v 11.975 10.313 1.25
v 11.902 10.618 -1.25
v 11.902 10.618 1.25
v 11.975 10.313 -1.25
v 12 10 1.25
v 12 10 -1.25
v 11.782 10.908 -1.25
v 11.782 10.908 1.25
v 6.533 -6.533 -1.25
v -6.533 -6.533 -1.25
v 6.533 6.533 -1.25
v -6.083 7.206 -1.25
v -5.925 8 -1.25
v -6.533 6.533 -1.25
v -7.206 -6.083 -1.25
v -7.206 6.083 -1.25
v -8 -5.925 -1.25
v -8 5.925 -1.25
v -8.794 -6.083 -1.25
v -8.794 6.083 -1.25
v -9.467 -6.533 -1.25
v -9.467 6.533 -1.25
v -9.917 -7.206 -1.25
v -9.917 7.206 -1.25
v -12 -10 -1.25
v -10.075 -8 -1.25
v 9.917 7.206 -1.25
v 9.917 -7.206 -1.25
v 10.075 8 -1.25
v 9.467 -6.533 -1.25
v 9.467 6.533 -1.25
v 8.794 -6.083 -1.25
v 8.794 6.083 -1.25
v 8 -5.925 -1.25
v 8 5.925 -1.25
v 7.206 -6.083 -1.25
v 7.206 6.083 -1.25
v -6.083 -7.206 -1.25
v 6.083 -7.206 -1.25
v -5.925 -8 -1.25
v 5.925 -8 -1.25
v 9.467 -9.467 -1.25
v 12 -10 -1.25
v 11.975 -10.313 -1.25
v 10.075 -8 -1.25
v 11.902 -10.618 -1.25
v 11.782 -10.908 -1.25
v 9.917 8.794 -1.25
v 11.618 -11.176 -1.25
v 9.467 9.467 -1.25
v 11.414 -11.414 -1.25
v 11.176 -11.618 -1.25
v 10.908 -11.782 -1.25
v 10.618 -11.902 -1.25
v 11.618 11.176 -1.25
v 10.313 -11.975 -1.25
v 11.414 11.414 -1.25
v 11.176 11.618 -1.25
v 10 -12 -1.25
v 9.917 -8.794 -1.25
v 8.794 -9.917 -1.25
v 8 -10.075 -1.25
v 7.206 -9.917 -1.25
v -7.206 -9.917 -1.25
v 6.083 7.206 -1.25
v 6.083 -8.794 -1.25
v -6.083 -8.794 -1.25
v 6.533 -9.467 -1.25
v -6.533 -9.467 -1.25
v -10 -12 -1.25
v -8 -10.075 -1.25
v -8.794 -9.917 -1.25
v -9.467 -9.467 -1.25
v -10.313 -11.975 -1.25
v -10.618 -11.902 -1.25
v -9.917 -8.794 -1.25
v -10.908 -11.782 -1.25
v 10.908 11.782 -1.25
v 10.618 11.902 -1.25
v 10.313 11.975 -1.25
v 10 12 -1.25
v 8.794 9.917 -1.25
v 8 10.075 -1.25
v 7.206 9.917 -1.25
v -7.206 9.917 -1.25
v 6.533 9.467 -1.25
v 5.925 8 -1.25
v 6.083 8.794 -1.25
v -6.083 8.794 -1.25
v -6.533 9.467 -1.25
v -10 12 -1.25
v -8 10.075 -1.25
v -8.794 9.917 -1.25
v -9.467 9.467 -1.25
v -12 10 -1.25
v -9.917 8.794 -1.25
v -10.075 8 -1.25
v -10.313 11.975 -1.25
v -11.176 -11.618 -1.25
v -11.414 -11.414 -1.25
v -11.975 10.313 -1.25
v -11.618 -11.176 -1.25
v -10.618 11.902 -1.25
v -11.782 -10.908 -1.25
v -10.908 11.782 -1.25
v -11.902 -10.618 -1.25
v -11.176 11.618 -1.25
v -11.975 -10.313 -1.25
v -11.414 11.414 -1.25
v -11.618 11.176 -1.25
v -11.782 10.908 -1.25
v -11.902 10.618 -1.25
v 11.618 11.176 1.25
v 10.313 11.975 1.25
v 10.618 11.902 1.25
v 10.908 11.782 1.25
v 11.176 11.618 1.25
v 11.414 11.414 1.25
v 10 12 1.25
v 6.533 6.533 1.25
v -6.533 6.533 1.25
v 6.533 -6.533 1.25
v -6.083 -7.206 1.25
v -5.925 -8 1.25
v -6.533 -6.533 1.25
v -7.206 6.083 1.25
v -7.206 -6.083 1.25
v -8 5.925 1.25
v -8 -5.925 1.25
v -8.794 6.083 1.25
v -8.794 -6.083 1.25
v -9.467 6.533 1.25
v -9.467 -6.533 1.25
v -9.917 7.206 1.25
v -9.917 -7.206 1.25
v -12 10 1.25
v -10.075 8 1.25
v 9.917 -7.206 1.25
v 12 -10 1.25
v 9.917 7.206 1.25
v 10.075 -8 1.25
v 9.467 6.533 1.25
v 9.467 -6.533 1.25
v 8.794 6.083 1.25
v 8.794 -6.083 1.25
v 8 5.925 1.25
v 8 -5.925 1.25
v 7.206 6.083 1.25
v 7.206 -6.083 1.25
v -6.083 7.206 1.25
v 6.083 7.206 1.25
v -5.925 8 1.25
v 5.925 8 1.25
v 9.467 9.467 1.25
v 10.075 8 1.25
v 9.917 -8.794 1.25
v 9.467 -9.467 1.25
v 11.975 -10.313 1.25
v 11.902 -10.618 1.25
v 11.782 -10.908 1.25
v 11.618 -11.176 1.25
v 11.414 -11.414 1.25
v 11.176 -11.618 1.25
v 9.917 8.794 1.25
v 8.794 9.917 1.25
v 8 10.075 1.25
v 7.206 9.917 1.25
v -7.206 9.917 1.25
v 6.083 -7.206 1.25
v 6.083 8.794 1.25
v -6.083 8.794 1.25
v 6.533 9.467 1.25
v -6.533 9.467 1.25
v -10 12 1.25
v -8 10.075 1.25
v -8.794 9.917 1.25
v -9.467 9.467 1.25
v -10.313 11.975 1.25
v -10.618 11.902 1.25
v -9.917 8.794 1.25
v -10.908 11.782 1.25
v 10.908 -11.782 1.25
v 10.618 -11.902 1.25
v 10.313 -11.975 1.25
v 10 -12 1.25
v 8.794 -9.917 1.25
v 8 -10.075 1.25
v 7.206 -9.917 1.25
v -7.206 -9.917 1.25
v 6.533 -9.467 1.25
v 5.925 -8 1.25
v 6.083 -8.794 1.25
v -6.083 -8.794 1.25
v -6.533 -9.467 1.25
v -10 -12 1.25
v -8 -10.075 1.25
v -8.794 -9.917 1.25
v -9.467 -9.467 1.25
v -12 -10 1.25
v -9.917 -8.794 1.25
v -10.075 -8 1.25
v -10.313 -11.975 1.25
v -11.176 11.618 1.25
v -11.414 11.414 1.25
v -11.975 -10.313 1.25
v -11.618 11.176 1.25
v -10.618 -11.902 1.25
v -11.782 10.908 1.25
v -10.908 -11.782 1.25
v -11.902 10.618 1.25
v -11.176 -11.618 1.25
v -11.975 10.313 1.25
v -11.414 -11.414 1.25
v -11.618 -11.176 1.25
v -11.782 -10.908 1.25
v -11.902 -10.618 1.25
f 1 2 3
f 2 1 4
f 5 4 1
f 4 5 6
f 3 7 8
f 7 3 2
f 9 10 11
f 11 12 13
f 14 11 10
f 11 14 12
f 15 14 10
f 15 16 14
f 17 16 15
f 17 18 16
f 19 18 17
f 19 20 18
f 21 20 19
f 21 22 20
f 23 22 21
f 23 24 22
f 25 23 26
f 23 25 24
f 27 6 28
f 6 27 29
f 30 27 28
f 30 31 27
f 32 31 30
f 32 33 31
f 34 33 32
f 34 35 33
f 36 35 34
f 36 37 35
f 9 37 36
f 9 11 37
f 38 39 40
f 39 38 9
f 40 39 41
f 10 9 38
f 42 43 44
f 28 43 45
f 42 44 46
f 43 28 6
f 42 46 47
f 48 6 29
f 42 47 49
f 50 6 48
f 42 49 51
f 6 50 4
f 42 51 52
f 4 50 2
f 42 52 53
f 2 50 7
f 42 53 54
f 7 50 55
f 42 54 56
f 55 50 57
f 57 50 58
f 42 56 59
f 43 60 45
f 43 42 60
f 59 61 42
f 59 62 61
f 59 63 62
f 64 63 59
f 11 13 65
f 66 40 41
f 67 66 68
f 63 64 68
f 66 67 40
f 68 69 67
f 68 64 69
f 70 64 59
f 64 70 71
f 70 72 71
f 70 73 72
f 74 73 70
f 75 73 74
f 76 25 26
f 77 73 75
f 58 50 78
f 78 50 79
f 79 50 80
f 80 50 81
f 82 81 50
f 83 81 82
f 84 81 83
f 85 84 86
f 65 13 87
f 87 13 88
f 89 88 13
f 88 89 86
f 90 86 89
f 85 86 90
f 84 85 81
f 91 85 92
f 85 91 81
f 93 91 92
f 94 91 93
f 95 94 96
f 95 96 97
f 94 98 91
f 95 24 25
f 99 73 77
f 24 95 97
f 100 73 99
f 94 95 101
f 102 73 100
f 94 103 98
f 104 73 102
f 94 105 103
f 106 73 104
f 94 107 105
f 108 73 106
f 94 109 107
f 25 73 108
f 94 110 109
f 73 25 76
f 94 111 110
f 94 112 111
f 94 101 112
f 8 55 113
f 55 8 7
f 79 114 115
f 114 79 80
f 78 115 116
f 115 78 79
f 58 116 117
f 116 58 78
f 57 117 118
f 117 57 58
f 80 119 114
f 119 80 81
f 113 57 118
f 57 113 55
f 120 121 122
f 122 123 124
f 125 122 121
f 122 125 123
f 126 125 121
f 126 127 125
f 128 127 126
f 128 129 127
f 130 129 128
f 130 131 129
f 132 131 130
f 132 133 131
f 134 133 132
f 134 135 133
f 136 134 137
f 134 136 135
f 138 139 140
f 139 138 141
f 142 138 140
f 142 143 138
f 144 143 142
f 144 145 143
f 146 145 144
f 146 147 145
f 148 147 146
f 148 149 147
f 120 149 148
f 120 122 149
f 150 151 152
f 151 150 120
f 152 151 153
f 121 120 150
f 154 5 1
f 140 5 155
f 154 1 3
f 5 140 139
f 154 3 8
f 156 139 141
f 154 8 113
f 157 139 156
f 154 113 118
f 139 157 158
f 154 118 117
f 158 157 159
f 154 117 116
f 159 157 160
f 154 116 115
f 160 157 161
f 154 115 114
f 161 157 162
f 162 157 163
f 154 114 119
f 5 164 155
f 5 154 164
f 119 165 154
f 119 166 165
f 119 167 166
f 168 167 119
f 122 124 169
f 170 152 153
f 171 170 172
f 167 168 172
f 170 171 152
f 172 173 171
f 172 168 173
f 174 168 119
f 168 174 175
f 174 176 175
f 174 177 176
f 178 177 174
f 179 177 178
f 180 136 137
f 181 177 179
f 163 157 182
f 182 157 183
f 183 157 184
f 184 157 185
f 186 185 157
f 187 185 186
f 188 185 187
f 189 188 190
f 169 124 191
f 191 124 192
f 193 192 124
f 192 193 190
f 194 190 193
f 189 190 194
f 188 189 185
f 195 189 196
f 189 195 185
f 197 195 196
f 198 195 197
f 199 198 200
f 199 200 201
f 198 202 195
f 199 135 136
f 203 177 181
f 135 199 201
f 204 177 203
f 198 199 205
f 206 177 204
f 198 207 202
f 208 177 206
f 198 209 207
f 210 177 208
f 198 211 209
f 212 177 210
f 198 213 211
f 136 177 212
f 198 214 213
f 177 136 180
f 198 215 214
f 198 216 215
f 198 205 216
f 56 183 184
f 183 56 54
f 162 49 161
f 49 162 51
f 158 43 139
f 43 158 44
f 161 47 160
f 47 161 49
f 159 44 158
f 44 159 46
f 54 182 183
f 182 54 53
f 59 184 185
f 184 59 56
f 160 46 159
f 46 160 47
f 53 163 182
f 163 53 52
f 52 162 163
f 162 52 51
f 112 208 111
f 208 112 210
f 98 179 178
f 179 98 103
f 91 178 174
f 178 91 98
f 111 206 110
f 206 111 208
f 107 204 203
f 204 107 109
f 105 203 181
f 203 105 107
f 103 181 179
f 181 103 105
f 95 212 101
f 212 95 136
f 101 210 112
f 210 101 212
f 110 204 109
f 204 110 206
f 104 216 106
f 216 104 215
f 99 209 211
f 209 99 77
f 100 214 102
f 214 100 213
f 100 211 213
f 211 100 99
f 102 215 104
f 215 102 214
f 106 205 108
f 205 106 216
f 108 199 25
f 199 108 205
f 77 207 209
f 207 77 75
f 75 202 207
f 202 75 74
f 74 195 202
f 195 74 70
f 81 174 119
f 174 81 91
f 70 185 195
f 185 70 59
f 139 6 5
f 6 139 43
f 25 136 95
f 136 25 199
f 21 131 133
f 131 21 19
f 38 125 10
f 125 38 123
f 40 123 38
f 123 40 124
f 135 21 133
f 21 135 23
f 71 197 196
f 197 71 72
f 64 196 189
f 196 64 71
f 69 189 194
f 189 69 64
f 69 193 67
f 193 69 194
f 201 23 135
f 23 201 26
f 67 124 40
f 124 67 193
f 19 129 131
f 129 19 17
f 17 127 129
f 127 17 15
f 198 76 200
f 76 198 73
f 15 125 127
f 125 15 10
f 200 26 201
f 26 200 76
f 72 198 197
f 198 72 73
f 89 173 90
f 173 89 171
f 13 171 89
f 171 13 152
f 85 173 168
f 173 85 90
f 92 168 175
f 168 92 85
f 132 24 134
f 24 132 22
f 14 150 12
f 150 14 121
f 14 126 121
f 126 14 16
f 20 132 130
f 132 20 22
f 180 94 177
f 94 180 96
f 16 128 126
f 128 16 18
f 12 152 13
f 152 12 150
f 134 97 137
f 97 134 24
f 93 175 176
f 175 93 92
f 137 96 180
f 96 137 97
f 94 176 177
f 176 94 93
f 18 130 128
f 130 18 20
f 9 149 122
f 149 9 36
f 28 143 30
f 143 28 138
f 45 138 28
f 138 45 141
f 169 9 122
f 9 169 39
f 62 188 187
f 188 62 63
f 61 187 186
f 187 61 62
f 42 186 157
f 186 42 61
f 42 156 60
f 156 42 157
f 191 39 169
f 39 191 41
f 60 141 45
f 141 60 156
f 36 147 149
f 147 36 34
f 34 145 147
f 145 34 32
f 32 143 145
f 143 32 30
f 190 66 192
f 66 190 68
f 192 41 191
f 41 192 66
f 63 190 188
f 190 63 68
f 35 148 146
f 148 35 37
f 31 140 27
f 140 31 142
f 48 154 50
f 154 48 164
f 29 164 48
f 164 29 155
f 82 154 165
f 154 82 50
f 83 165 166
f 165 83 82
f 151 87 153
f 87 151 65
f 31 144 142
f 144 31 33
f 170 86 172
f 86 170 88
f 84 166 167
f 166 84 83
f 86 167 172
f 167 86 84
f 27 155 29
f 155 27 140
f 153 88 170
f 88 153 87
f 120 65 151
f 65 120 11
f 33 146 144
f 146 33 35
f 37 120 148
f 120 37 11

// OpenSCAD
// Created by Heindal at Thingiverse on March 2015

// Values for user to edit

// Thickness of shim, mounting plate, or standoff
thickness = 2.5; // [1:25]

// Length of shim
length = 24; // [8,12,24,40,56]

// Hole Diameter
holeDia = 4.15; // [3.4:3.4mm for Tap, 4.15:4.15mm for Tight Fit, 4.3:4.3mm for Loose Fit] 

/* [Hidden] */
// Calculated values - edit at your own risk
width = 24;

module rounded_box(l,w,h,r_edge){

cube(size=[l-2*r_edge,w-2*r_edge,h ],center=true);

for (x = [l/2-r_edge,-(l/2-r_edge) ]) {
	for (y = [(w/2-r_edge),-(w/2-r_edge)]) {
		translate([x,y,0]) cylinder(r1=r_edge,r2=r_edge,h=h,center=true,$fn=40);
	}
}
translate([0,w/2-r_edge,0]) cube(size=[l-2*r_edge,2*r_edge,h ],center=true);
translate([0,-(w/2-r_edge),0]) cube(size=[l-2*r_edge,2*r_edge,h ],center=true);
translate([(l/2-r_edge),0,0]) cube(size=[2*r_edge,w-2*r_edge,h ],center=true);
translate([-(l/2-r_edge),0,0]) cube(size=[2*r_edge,w-2*r_edge,h ],center=true);

}

difference() {
	rounded_box(length,width,thickness,2);
	// mounting holes to match the rail
	for (x = [-16*floor(length/16)/2 : 16 : 16*floor(length/16)/2]) {
		for (y = [-8,8]) {
			translate([x,y,0]) cylinder(r=holeDia/2, h=thickness+1, center=true, $fn=16);
		}
	}
}
